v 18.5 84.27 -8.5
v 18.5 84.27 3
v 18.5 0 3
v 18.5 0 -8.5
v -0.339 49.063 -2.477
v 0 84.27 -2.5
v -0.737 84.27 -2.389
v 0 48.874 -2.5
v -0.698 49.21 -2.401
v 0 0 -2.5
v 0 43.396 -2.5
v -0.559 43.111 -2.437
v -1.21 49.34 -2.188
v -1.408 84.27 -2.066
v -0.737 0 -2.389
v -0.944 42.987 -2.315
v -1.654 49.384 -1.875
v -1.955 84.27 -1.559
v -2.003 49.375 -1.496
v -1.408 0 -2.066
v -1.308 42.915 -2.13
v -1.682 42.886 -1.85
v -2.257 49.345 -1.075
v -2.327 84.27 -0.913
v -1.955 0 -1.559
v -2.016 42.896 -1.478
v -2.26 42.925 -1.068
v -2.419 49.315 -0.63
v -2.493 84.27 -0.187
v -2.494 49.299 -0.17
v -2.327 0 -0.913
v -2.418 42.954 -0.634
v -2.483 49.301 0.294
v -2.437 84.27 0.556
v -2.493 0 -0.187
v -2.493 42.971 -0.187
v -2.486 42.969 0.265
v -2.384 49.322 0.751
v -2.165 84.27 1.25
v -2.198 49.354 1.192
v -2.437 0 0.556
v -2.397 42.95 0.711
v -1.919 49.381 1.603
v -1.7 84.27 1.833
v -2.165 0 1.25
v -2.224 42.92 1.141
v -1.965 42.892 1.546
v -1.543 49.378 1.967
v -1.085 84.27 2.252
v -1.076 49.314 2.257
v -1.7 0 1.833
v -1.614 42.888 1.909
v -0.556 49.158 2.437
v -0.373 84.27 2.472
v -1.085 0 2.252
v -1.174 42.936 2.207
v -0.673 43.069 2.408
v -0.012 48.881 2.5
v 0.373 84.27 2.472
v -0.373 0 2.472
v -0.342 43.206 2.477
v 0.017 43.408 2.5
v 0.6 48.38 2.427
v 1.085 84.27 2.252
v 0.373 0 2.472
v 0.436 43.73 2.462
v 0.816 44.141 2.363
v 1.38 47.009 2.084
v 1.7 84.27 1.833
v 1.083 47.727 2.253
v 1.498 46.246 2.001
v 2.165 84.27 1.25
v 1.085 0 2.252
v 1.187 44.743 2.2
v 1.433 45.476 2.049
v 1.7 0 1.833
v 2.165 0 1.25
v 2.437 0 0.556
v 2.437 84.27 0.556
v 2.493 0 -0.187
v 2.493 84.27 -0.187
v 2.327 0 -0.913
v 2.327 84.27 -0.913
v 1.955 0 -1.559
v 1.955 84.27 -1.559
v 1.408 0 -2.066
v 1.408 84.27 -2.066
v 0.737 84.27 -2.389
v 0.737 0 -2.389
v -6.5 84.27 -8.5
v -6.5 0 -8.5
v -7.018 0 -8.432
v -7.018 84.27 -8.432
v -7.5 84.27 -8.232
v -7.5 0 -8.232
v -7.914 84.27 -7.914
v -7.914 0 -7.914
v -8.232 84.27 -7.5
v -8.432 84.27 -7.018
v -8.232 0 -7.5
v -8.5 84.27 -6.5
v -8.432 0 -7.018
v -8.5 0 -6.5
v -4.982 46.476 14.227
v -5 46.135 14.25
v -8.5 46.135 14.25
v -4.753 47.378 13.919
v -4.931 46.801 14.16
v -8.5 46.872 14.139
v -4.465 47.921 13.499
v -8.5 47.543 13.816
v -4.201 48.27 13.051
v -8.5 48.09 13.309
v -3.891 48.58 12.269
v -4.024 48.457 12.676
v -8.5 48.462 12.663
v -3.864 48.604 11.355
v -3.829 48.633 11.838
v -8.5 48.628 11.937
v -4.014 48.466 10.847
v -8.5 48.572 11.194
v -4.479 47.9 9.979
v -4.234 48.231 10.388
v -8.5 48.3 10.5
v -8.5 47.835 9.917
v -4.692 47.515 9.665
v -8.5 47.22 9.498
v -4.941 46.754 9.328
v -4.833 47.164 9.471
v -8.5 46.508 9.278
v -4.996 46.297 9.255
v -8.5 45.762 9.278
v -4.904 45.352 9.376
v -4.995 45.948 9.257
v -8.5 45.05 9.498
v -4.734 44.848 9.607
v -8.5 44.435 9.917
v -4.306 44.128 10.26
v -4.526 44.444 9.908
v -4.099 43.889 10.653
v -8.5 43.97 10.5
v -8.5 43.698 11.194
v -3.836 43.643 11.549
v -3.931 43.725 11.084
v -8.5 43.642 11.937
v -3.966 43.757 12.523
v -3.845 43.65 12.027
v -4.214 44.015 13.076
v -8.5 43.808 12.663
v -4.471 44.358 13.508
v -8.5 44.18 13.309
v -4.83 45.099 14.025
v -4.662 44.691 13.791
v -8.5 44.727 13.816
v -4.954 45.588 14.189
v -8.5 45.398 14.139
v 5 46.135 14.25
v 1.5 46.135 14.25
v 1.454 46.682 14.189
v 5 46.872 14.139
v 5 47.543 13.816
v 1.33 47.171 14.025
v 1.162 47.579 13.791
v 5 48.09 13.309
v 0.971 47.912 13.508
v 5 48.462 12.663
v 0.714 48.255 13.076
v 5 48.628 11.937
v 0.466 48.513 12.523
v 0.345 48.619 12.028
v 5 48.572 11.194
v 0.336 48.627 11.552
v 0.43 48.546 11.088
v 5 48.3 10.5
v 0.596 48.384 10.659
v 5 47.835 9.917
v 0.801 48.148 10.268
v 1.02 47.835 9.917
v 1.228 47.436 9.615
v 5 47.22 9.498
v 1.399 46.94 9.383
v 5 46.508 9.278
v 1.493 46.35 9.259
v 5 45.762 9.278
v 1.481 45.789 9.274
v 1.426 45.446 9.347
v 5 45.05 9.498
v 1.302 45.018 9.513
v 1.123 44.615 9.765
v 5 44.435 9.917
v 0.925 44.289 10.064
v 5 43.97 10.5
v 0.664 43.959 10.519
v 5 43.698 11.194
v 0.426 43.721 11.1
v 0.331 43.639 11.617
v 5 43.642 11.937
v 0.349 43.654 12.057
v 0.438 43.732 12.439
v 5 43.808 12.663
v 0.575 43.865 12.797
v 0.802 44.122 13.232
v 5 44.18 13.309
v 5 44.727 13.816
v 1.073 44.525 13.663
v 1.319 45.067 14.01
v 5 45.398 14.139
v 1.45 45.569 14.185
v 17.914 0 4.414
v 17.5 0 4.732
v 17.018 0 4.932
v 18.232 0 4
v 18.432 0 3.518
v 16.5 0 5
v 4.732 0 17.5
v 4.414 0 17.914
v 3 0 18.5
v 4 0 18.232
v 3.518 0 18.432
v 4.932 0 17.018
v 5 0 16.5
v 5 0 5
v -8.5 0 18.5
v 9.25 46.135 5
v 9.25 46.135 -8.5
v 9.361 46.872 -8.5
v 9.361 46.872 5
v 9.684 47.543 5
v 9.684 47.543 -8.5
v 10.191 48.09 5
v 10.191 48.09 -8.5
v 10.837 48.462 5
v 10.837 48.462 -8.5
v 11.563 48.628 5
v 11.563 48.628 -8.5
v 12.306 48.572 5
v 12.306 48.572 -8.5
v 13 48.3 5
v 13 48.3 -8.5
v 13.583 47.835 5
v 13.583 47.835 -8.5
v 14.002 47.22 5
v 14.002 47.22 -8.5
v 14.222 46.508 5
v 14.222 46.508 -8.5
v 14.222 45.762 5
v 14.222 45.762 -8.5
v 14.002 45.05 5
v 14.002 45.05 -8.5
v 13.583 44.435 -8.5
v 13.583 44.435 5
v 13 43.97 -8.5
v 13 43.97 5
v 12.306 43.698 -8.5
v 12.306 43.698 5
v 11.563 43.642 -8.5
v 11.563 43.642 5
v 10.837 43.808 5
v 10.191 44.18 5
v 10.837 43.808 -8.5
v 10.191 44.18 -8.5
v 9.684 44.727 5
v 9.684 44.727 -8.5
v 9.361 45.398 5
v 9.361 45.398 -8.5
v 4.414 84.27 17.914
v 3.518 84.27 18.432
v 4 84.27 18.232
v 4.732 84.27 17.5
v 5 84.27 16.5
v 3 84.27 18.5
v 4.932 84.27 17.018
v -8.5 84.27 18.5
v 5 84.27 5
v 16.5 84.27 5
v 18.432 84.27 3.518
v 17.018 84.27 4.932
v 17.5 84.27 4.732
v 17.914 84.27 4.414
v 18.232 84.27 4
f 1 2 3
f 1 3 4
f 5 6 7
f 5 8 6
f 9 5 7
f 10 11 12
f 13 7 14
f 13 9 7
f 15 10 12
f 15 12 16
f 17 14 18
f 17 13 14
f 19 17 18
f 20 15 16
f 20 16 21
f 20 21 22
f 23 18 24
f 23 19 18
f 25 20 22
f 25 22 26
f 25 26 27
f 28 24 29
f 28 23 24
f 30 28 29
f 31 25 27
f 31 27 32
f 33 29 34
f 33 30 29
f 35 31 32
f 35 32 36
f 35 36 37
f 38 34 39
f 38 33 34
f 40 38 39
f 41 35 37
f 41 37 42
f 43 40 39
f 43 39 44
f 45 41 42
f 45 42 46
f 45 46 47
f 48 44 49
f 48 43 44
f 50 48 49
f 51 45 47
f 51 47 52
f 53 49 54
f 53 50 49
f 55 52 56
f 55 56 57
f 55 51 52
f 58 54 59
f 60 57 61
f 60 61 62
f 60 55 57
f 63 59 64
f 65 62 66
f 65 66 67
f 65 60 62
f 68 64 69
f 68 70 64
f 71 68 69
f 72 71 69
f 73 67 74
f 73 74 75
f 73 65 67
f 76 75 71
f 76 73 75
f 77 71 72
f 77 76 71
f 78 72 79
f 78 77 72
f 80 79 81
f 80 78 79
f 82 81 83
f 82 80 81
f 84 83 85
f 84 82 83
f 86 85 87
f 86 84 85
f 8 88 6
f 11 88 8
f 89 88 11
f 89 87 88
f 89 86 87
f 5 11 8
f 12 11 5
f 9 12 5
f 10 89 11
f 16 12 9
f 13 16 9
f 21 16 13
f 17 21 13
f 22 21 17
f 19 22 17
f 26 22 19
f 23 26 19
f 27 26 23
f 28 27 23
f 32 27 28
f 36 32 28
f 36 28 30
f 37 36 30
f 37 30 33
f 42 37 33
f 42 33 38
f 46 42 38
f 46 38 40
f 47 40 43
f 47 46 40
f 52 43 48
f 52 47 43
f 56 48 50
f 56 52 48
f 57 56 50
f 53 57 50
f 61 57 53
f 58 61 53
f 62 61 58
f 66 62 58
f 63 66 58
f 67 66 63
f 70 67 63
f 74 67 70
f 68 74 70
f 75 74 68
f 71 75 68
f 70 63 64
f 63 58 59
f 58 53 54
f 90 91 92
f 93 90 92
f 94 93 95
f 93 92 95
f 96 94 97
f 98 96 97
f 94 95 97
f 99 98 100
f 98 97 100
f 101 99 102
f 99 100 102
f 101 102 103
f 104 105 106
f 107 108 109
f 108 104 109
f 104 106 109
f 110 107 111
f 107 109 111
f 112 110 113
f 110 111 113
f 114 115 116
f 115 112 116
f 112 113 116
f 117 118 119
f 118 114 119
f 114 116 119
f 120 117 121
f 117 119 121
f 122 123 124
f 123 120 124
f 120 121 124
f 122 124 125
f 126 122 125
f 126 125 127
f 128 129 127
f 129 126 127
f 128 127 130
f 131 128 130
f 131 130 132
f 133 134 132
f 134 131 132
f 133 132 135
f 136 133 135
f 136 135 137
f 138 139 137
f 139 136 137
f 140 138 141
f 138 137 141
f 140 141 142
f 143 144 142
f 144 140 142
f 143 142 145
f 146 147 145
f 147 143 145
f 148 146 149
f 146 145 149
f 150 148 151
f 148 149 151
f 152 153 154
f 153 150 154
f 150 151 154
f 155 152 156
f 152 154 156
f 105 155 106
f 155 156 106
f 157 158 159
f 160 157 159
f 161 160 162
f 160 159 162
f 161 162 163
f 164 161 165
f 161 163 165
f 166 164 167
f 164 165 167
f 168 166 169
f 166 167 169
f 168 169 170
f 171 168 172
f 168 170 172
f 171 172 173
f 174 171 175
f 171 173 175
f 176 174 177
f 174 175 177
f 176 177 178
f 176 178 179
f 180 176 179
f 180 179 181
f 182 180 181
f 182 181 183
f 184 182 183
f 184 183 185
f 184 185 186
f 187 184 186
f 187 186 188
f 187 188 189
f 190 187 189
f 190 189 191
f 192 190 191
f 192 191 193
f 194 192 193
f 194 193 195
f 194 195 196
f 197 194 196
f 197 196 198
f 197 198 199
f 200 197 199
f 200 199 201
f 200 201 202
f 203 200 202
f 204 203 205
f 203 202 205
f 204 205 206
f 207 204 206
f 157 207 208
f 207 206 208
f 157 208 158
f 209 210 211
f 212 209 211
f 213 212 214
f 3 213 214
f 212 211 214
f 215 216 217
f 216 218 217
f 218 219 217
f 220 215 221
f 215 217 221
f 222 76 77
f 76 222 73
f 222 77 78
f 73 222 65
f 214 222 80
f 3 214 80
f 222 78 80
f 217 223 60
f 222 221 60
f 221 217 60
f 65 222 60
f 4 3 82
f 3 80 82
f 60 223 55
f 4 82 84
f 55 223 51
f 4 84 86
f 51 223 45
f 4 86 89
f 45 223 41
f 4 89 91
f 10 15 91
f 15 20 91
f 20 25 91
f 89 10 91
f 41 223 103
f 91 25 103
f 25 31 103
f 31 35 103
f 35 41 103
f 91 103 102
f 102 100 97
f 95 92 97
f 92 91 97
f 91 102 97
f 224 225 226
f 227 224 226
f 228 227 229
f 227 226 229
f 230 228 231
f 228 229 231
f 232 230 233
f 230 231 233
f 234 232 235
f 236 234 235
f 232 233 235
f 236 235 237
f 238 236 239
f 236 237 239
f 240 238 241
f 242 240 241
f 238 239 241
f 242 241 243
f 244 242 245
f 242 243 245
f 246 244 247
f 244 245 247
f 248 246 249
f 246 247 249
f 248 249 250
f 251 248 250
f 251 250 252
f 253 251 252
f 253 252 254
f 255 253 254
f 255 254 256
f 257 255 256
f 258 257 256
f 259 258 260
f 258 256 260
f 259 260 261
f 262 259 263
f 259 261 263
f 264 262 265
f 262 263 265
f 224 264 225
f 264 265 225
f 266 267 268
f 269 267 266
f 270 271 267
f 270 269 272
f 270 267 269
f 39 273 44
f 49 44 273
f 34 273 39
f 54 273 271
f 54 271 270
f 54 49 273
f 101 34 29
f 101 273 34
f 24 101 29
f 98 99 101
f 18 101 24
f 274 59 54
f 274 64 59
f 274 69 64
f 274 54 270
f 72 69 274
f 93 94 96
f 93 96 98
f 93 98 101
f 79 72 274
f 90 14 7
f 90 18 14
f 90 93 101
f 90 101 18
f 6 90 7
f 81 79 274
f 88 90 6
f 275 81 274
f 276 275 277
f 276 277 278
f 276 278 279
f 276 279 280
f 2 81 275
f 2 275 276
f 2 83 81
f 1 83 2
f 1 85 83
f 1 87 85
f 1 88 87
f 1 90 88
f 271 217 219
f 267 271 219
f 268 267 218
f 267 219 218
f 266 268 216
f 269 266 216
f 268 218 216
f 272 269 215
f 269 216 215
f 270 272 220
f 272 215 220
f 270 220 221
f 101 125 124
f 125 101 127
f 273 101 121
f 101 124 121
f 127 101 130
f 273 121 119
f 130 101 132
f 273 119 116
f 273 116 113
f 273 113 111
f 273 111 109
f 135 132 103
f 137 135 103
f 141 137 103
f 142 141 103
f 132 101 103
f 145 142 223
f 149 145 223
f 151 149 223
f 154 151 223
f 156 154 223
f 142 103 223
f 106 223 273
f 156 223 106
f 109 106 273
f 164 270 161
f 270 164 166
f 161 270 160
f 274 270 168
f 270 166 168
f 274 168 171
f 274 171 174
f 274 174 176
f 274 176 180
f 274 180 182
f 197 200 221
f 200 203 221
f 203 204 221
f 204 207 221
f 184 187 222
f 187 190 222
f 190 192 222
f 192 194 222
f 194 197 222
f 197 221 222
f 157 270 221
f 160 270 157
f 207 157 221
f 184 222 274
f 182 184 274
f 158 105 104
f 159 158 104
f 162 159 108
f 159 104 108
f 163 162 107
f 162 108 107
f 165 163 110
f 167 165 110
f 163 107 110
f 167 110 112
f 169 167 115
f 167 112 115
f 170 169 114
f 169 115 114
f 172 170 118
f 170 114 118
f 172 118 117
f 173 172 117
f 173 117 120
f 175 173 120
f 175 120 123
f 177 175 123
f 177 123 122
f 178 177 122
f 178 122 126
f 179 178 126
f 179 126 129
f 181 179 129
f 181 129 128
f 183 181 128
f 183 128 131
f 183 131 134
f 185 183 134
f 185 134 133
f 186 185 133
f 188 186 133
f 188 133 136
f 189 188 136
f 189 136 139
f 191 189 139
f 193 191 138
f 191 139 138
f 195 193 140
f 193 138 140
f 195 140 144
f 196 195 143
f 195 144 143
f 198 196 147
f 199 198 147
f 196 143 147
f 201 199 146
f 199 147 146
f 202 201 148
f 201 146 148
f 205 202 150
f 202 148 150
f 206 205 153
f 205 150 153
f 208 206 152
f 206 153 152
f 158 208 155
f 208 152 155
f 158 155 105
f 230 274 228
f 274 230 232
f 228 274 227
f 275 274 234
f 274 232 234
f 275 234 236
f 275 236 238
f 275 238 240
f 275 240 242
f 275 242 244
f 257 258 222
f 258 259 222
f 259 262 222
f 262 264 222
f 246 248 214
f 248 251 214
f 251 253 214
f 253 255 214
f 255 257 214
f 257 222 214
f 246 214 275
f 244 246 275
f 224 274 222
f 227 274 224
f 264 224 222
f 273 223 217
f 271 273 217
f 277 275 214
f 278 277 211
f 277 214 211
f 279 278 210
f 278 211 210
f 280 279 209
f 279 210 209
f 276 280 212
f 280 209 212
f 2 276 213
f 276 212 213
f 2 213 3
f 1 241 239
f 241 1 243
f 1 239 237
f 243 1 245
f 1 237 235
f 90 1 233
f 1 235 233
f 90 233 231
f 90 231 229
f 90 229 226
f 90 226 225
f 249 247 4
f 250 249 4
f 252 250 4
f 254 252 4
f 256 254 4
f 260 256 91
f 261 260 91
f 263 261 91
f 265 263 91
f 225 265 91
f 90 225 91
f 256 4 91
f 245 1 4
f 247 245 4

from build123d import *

# Parameters (mm, degrees)
SKETCH4_W           = 13.5
SKETCH4_H           = 13.5
SKETCH4_R           = 2.5
HOLE_TOPMAIN_DEPTH  = 64.27
SKETCH14_R          = 2.5
CUT_EXTRUDE9_DEPTH  = 67.220336
SKETCH15_R          = 3.25
CUT_EXTRUDE10_DEPTH = 66.384500568
SKETCH18_W          = 13.5
SKETCH18_H          = 64.27
SKETCH18_R          = 3.25
BOSS_EXTRUDE2_DEPTH = 13.5
FILLET3_R           = 2
SKETCH19_R          = 2.5
CUT_EXTRUDE11_DEPTH = 13.5
SKETCH22_W          = 13.5
SKETCH22_H          = 64.27
BOSS_EXTRUDE3_DEPTH = 13.5
BOSS_EXTRUDE5_START = -27
SKETCH24_R          = 3.25
BOSS_EXTRUDE5_DEPTH = 27
CUT_EXTRUDE12_START = -64.27
SKETCH25_R          = 2.5
CUT_EXTRUDE12_DEPTH = 64.27
SKETCH26_R          = 2.5
CUT_EXTRUDE13_DEPTH = 13.5
SKETCH28_R          = 2.5
CUT_EXTRUDE14_DEPTH = 13.5
FILLET4_R           = 2
SKETCH29_R          = 2.5
BOSS_EXTRUDE6_DEPTH = 20


with BuildPart() as part:
    # Sketch4 → hole-TopMain (new body)
    with BuildSketch(Plane(origin=(0, 0, 0), x_dir=(1, 0, 0), z_dir=(0, 1, 0))):
        with Locations((-1.75, 1.75)):
            Rectangle(SKETCH4_W, SKETCH4_H)
        with Locations(Location((0, 0, 0), (0, 0, 90))):
            Circle(SKETCH4_R, mode=Mode.SUBTRACT)
    extrude(amount=HOLE_TOPMAIN_DEPTH)

    # Sketch14 → Cut-Extrude9 (cut, through all)
    with BuildSketch(Plane(origin=(0, 0, -8.5), x_dir=(-1, 0, 0), z_dir=(0, 0, -1))):
        with Locations((1.75, 46.135)):
            Circle(SKETCH14_R)
    extrude(amount=-CUT_EXTRUDE9_DEPTH, mode=Mode.SUBTRACT)

    # Sketch15 → Cut-Extrude10 (cut, through all)
    with BuildSketch(Plane(origin=(0, 0, -3.5), x_dir=(-1, 0, 0), z_dir=(0, 0, -1))):
        with Locations((1.75, 46.135)):
            Circle(SKETCH15_R)
    extrude(amount=-CUT_EXTRUDE10_DEPTH, mode=Mode.SUBTRACT)

    # Sketch18 → Boss-Extrude2 (add)
    with BuildSketch(Plane.XY.offset(5)):
        with Locations((-1.75, 32.135)):
            Rectangle(SKETCH18_W, SKETCH18_H)
        with Locations(Location((-1.75, 46.135, 0), (0, 0, 180))):
            Circle(SKETCH18_R, mode=Mode.SUBTRACT)
    extrude(amount=BOSS_EXTRUDE2_DEPTH)

    # Fillet3
    fillet3_edges = [part.edges().sort_by_distance(p)[0] for p in [
        (-8.5, 32.135, -8.5),
        (5, 32.135, 18.5),
    ]]
    fillet(fillet3_edges, radius=FILLET3_R)

    # Sketch19 → Cut-Extrude11 (cut)
    with BuildSketch(Plane.ZY.offset(8.5)):
        with Locations((11.75, 46.135)):
            Circle(SKETCH19_R)
    extrude(amount=-CUT_EXTRUDE11_DEPTH, mode=Mode.SUBTRACT)

    # Sketch22 → Boss-Extrude3 (add)
    with BuildSketch(Plane(origin=(5, 0, 0), x_dir=(0, 0, -1), z_dir=(1, 0, 0))):
        with Locations((1.75, 32.135)):
            Rectangle(SKETCH22_W, SKETCH22_H)
    extrude(amount=BOSS_EXTRUDE3_DEPTH)

    # Sketch24 → Boss-Extrude5 (add)
    with BuildSketch(Plane.XY.offset(18.5).offset(BOSS_EXTRUDE5_START)):
        with Locations((-1.75, 46.135)):
            Circle(SKETCH24_R)
    extrude(amount=BOSS_EXTRUDE5_DEPTH)

    # Sketch25 → Cut-Extrude12 (cut)
    with BuildSketch(Plane(origin=(0, 64.27, 0), x_dir=(1, 0, 0), z_dir=(0, 1, 0)).offset(CUT_EXTRUDE12_START)):
        with Locations(Location((0, 0, 0), (0, 0, 90))):
            Circle(SKETCH25_R)
    extrude(amount=CUT_EXTRUDE12_DEPTH, mode=Mode.SUBTRACT)

    # Sketch26 → Cut-Extrude13 (cut)
    with BuildSketch(Plane.ZY.offset(8.5)):
        with Locations((11.75, 46.135)):
            Circle(SKETCH26_R)
    extrude(amount=-CUT_EXTRUDE13_DEPTH, mode=Mode.SUBTRACT)

    # Sketch28 → Cut-Extrude14 (cut)
    with BuildSketch(Plane(origin=(0, 0, -8.5), x_dir=(-1, 0, 0), z_dir=(0, 0, -1))):
        with Locations((-11.75, 46.135)):
            Circle(SKETCH28_R)
    extrude(amount=-CUT_EXTRUDE14_DEPTH, mode=Mode.SUBTRACT)

    # Fillet4
    fillet4_edges = [part.edges().sort_by_distance(p)[0] for p in [
        (18.5, 32.135, 5),
    ]]
    fillet(fillet4_edges, radius=FILLET4_R)

    # Sketch29 → Boss-Extrude6 (add)
    with BuildSketch(Plane(origin=(0, 64.27, 0), x_dir=(1, 0, 0), z_dir=(0, 1, 0))):
        with BuildLine():
            Line((5, -16.5), (5, -5))
            Line((5, -5), (16.5, -5))
            ThreePointArc((16.5, -5), (17.914213562, -4.414213562), (18.5, -3))
            Line((18.5, -3), (18.5, 8.5))
            Line((18.5, 8.5), (-6.5, 8.5))
            ThreePointArc((-6.5, 8.5), (-7.914213562, 7.914213562), (-8.5, 6.5))
            Line((-8.5, 6.5), (-8.5, -18.5))
            Line((-8.5, -18.5), (3, -18.5))
            ThreePointArc((3, -18.5), (4.414213562, -17.914213562), (5, -16.5))
        make_face()
        with Locations(Location((0, 0, 0), (0, 0, 90))):
            Circle(SKETCH29_R, mode=Mode.SUBTRACT)
    extrude(amount=BOSS_EXTRUDE6_DEPTH)


solid = part.part
